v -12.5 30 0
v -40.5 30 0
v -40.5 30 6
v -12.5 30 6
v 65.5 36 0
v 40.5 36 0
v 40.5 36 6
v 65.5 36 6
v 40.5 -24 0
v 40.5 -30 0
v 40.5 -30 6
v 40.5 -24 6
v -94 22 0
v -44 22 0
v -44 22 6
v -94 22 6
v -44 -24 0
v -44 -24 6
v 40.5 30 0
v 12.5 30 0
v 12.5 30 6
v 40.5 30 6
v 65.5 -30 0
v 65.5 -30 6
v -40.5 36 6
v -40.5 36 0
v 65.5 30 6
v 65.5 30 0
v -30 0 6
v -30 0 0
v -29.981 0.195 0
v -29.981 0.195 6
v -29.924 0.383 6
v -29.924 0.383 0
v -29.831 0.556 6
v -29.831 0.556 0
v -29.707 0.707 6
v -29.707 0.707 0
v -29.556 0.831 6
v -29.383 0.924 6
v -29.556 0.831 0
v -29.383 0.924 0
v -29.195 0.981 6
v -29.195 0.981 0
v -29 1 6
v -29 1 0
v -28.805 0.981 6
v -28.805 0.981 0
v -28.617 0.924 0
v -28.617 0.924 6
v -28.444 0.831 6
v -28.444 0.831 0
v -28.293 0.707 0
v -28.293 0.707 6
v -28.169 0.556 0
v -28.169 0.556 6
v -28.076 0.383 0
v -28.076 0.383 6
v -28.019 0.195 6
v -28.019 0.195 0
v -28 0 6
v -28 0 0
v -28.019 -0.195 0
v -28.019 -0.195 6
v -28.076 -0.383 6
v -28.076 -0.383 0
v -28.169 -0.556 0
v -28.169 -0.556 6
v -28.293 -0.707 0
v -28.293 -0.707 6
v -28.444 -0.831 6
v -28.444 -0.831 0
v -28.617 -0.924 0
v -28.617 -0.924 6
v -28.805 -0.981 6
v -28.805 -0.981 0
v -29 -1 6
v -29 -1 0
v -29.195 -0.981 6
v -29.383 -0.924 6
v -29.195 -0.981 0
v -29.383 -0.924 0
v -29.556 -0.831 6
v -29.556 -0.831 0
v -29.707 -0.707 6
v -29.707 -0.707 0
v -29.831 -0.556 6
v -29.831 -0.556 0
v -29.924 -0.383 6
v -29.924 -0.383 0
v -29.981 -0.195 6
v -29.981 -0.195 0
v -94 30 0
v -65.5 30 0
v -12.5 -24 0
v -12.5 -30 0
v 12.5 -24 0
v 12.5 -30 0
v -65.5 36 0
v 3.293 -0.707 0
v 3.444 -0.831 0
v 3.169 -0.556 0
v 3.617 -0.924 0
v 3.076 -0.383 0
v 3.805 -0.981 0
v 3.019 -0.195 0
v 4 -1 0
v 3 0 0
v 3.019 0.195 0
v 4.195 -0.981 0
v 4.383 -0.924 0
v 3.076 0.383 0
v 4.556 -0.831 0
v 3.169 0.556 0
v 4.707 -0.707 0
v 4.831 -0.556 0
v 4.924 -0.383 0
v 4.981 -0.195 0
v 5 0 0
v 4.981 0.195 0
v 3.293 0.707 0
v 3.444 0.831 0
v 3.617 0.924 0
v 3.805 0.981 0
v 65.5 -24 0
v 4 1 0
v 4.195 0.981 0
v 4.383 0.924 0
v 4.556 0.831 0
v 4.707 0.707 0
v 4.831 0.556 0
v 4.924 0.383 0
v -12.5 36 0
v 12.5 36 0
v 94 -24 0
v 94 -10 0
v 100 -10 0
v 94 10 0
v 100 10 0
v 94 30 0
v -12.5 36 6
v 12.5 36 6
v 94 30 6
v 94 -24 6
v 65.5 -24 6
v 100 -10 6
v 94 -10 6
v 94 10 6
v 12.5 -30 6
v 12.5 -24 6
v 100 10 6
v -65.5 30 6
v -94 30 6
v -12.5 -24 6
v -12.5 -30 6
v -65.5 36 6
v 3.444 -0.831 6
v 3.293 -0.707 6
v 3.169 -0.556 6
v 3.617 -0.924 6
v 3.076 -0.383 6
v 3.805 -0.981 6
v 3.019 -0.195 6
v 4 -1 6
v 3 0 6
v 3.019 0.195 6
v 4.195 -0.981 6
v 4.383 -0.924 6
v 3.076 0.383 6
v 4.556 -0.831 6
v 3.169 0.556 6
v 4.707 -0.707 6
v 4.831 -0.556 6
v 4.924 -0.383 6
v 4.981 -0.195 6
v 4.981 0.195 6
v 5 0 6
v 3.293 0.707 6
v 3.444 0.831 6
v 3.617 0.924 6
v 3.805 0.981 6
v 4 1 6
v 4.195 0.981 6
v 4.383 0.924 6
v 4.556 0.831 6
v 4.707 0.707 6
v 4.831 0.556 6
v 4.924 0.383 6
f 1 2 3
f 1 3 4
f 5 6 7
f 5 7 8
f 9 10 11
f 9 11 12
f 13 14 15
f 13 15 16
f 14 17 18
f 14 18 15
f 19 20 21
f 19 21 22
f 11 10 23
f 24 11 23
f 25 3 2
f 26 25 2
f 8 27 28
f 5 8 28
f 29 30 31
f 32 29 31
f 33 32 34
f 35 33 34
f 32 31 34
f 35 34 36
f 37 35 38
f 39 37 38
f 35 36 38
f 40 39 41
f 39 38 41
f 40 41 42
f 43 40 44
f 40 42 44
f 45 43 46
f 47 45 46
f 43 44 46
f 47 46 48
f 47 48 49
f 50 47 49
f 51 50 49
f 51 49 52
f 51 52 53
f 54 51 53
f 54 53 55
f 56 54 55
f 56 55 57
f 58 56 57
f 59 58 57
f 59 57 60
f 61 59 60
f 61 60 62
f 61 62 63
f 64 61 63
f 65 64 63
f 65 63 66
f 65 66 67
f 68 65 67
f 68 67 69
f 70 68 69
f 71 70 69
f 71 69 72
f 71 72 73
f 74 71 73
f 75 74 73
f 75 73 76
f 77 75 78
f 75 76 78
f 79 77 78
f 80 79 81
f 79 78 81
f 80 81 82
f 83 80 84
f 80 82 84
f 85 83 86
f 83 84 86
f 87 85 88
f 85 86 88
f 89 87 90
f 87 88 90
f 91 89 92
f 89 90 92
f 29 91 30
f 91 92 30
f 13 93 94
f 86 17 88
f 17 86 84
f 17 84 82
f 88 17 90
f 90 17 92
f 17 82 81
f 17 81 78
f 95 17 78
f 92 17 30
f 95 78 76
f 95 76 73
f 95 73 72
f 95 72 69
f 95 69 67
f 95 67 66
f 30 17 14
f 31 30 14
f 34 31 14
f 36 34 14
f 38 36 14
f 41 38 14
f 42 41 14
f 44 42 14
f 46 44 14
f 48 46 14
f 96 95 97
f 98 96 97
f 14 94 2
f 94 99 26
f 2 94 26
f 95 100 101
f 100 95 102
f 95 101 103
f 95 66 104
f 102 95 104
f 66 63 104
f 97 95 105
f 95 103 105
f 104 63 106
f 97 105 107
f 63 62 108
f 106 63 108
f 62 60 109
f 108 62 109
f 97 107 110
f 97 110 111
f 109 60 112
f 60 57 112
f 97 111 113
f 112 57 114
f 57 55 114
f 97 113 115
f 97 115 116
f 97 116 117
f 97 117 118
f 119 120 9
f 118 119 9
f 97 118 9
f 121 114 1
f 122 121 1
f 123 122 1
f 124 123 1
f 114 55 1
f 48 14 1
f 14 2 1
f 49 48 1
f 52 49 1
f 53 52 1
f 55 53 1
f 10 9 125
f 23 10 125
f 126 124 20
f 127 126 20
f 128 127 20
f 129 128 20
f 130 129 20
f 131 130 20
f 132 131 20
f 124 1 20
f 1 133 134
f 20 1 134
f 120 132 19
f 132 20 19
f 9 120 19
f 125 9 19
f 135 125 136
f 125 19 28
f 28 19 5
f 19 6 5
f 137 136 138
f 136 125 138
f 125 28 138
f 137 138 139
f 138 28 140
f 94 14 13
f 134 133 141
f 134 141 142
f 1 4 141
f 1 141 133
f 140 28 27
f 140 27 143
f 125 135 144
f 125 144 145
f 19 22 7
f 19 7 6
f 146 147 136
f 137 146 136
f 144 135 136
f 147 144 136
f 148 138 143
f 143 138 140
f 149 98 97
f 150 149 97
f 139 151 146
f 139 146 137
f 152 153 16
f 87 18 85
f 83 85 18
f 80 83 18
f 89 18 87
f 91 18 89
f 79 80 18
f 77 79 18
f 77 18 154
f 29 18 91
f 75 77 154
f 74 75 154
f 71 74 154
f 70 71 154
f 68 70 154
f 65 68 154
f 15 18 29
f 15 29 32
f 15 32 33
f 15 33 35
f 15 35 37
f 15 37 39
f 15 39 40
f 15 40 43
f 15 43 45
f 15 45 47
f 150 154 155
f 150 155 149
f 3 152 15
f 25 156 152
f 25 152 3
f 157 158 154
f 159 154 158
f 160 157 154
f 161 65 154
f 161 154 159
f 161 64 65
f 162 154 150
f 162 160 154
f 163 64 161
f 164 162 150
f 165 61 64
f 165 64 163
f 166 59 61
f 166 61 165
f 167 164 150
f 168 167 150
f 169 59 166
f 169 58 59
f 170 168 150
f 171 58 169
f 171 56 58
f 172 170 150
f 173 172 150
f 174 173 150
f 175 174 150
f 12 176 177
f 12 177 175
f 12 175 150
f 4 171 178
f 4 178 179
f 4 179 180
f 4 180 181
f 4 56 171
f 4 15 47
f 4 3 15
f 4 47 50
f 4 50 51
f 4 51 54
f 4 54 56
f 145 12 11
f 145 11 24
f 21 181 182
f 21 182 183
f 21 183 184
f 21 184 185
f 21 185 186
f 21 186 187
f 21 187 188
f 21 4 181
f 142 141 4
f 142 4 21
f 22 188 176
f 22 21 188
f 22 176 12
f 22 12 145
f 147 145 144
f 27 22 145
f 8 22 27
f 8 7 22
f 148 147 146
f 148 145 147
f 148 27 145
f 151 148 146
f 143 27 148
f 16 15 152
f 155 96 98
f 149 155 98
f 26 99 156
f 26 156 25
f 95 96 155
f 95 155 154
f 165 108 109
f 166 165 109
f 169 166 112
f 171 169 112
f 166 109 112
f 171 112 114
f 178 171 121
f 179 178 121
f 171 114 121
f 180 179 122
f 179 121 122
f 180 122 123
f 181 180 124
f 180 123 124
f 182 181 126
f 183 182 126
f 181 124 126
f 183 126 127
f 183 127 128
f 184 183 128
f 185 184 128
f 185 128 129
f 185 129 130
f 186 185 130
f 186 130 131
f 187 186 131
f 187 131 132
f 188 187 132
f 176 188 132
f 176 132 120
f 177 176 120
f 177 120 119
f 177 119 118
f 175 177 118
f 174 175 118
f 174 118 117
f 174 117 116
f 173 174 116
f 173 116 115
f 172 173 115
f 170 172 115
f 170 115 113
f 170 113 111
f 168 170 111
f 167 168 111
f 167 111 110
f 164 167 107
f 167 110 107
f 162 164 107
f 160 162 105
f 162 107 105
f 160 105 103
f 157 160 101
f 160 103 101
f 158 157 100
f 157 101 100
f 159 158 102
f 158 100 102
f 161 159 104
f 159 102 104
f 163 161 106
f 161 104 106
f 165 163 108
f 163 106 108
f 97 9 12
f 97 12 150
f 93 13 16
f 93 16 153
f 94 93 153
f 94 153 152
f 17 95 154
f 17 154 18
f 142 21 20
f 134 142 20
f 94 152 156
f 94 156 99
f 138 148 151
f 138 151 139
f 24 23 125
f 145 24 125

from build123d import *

# Parameters (mm, degrees)
ESQUISSE1_W             = 188
ESQUISSE1_H             = 60
BOSS_EXTRU_1_DEPTH      = 6
ESQUISSE3_W             = 50
ESQUISSE3_H             = 52
ENL_V_MAT_EXTRU_2_DEPTH = 10
ESQUISSE6_W             = 6
ESQUISSE6_H             = 20
BOSS_EXTRU_2_DEPTH      = 6
ESQUISSE7_W             = 25
ESQUISSE7_H             = 6
BOSS_EXTRU_3_DEPTH      = 6
ESQUISSE8_R             = 1
ENL_V_MAT_EXTRU_4_DEPTH = 10
ESQUISSE9_W             = 28.5
ESQUISSE9_H             = 6
ESQUISSE9_W_2           = 28
ESQUISSE9_W_3           = 31.5
ENL_V_MAT_EXTRU_5_DEPTH = 10


with BuildPart() as part:
    # Esquisse1 → Boss.-Extru.1 (new body)
    with BuildSketch(Plane.XY):
        Rectangle(ESQUISSE1_W, ESQUISSE1_H)
    extrude(amount=BOSS_EXTRU_1_DEPTH)

    # Esquisse3 → Enlèv. mat.-Extru.2 (cut)
    with BuildSketch(Plane(origin=(0, 0, 0), x_dir=(-1, 0, 0), z_dir=(0, 0, -1))):
        with Locations((69, -4)):
            Rectangle(ESQUISSE3_W, ESQUISSE3_H)
    extrude(amount=-ENL_V_MAT_EXTRU_2_DEPTH, mode=Mode.SUBTRACT)

    # Esquisse6 → Boss.-Extru.2 (add)
    with BuildSketch(Plane(origin=(94, 0, 0), x_dir=(0, 0, -1), z_dir=(1, 0, 0))):
        with Locations((-3, 0)):
            Rectangle(ESQUISSE6_W, ESQUISSE6_H)
    extrude(amount=BOSS_EXTRU_2_DEPTH)

    # Esquisse7 → Boss.-Extru.3 (add)
    with BuildSketch(Plane(origin=(0, 30, 0), x_dir=(1, 0, 0), z_dir=(0, 1, 0))):
        with Locations((53, -3)):
            Rectangle(ESQUISSE7_W, ESQUISSE7_H)
        with Locations((0, -3)):
            Rectangle(ESQUISSE7_W, ESQUISSE7_H)
        with Locations((-53, -3)):
            Rectangle(ESQUISSE7_W, ESQUISSE7_H)
    extrude(amount=BOSS_EXTRU_3_DEPTH)

    # Esquisse8 → Enlèv. mat.-Extru.4 (cut)
    with BuildSketch(Plane(origin=(0, 0, 0), x_dir=(-1, 0, 0), z_dir=(0, 0, -1))):
        with Locations((29, 0)):
            Circle(ESQUISSE8_R)
        with Locations((-4, 0)):
            Circle(ESQUISSE8_R)
    extrude(amount=-ENL_V_MAT_EXTRU_4_DEPTH, mode=Mode.SUBTRACT)

    # Esquisse9 → Enlèv. mat.-Extru.5 (cut)
    with BuildSketch(Plane(origin=(0, 0, 0), x_dir=(-1, 0, 0), z_dir=(0, 0, -1))):
        with Locations((-79.75, -27)):
            Rectangle(ESQUISSE9_W, ESQUISSE9_H)
        with Locations((-26.5, -27)):
            Rectangle(ESQUISSE9_W_2, ESQUISSE9_H)
        with Locations((28.25, -27)):
            Rectangle(ESQUISSE9_W_3, ESQUISSE9_H)
    extrude(amount=-ENL_V_MAT_EXTRU_5_DEPTH, mode=Mode.SUBTRACT)


solid = part.part
